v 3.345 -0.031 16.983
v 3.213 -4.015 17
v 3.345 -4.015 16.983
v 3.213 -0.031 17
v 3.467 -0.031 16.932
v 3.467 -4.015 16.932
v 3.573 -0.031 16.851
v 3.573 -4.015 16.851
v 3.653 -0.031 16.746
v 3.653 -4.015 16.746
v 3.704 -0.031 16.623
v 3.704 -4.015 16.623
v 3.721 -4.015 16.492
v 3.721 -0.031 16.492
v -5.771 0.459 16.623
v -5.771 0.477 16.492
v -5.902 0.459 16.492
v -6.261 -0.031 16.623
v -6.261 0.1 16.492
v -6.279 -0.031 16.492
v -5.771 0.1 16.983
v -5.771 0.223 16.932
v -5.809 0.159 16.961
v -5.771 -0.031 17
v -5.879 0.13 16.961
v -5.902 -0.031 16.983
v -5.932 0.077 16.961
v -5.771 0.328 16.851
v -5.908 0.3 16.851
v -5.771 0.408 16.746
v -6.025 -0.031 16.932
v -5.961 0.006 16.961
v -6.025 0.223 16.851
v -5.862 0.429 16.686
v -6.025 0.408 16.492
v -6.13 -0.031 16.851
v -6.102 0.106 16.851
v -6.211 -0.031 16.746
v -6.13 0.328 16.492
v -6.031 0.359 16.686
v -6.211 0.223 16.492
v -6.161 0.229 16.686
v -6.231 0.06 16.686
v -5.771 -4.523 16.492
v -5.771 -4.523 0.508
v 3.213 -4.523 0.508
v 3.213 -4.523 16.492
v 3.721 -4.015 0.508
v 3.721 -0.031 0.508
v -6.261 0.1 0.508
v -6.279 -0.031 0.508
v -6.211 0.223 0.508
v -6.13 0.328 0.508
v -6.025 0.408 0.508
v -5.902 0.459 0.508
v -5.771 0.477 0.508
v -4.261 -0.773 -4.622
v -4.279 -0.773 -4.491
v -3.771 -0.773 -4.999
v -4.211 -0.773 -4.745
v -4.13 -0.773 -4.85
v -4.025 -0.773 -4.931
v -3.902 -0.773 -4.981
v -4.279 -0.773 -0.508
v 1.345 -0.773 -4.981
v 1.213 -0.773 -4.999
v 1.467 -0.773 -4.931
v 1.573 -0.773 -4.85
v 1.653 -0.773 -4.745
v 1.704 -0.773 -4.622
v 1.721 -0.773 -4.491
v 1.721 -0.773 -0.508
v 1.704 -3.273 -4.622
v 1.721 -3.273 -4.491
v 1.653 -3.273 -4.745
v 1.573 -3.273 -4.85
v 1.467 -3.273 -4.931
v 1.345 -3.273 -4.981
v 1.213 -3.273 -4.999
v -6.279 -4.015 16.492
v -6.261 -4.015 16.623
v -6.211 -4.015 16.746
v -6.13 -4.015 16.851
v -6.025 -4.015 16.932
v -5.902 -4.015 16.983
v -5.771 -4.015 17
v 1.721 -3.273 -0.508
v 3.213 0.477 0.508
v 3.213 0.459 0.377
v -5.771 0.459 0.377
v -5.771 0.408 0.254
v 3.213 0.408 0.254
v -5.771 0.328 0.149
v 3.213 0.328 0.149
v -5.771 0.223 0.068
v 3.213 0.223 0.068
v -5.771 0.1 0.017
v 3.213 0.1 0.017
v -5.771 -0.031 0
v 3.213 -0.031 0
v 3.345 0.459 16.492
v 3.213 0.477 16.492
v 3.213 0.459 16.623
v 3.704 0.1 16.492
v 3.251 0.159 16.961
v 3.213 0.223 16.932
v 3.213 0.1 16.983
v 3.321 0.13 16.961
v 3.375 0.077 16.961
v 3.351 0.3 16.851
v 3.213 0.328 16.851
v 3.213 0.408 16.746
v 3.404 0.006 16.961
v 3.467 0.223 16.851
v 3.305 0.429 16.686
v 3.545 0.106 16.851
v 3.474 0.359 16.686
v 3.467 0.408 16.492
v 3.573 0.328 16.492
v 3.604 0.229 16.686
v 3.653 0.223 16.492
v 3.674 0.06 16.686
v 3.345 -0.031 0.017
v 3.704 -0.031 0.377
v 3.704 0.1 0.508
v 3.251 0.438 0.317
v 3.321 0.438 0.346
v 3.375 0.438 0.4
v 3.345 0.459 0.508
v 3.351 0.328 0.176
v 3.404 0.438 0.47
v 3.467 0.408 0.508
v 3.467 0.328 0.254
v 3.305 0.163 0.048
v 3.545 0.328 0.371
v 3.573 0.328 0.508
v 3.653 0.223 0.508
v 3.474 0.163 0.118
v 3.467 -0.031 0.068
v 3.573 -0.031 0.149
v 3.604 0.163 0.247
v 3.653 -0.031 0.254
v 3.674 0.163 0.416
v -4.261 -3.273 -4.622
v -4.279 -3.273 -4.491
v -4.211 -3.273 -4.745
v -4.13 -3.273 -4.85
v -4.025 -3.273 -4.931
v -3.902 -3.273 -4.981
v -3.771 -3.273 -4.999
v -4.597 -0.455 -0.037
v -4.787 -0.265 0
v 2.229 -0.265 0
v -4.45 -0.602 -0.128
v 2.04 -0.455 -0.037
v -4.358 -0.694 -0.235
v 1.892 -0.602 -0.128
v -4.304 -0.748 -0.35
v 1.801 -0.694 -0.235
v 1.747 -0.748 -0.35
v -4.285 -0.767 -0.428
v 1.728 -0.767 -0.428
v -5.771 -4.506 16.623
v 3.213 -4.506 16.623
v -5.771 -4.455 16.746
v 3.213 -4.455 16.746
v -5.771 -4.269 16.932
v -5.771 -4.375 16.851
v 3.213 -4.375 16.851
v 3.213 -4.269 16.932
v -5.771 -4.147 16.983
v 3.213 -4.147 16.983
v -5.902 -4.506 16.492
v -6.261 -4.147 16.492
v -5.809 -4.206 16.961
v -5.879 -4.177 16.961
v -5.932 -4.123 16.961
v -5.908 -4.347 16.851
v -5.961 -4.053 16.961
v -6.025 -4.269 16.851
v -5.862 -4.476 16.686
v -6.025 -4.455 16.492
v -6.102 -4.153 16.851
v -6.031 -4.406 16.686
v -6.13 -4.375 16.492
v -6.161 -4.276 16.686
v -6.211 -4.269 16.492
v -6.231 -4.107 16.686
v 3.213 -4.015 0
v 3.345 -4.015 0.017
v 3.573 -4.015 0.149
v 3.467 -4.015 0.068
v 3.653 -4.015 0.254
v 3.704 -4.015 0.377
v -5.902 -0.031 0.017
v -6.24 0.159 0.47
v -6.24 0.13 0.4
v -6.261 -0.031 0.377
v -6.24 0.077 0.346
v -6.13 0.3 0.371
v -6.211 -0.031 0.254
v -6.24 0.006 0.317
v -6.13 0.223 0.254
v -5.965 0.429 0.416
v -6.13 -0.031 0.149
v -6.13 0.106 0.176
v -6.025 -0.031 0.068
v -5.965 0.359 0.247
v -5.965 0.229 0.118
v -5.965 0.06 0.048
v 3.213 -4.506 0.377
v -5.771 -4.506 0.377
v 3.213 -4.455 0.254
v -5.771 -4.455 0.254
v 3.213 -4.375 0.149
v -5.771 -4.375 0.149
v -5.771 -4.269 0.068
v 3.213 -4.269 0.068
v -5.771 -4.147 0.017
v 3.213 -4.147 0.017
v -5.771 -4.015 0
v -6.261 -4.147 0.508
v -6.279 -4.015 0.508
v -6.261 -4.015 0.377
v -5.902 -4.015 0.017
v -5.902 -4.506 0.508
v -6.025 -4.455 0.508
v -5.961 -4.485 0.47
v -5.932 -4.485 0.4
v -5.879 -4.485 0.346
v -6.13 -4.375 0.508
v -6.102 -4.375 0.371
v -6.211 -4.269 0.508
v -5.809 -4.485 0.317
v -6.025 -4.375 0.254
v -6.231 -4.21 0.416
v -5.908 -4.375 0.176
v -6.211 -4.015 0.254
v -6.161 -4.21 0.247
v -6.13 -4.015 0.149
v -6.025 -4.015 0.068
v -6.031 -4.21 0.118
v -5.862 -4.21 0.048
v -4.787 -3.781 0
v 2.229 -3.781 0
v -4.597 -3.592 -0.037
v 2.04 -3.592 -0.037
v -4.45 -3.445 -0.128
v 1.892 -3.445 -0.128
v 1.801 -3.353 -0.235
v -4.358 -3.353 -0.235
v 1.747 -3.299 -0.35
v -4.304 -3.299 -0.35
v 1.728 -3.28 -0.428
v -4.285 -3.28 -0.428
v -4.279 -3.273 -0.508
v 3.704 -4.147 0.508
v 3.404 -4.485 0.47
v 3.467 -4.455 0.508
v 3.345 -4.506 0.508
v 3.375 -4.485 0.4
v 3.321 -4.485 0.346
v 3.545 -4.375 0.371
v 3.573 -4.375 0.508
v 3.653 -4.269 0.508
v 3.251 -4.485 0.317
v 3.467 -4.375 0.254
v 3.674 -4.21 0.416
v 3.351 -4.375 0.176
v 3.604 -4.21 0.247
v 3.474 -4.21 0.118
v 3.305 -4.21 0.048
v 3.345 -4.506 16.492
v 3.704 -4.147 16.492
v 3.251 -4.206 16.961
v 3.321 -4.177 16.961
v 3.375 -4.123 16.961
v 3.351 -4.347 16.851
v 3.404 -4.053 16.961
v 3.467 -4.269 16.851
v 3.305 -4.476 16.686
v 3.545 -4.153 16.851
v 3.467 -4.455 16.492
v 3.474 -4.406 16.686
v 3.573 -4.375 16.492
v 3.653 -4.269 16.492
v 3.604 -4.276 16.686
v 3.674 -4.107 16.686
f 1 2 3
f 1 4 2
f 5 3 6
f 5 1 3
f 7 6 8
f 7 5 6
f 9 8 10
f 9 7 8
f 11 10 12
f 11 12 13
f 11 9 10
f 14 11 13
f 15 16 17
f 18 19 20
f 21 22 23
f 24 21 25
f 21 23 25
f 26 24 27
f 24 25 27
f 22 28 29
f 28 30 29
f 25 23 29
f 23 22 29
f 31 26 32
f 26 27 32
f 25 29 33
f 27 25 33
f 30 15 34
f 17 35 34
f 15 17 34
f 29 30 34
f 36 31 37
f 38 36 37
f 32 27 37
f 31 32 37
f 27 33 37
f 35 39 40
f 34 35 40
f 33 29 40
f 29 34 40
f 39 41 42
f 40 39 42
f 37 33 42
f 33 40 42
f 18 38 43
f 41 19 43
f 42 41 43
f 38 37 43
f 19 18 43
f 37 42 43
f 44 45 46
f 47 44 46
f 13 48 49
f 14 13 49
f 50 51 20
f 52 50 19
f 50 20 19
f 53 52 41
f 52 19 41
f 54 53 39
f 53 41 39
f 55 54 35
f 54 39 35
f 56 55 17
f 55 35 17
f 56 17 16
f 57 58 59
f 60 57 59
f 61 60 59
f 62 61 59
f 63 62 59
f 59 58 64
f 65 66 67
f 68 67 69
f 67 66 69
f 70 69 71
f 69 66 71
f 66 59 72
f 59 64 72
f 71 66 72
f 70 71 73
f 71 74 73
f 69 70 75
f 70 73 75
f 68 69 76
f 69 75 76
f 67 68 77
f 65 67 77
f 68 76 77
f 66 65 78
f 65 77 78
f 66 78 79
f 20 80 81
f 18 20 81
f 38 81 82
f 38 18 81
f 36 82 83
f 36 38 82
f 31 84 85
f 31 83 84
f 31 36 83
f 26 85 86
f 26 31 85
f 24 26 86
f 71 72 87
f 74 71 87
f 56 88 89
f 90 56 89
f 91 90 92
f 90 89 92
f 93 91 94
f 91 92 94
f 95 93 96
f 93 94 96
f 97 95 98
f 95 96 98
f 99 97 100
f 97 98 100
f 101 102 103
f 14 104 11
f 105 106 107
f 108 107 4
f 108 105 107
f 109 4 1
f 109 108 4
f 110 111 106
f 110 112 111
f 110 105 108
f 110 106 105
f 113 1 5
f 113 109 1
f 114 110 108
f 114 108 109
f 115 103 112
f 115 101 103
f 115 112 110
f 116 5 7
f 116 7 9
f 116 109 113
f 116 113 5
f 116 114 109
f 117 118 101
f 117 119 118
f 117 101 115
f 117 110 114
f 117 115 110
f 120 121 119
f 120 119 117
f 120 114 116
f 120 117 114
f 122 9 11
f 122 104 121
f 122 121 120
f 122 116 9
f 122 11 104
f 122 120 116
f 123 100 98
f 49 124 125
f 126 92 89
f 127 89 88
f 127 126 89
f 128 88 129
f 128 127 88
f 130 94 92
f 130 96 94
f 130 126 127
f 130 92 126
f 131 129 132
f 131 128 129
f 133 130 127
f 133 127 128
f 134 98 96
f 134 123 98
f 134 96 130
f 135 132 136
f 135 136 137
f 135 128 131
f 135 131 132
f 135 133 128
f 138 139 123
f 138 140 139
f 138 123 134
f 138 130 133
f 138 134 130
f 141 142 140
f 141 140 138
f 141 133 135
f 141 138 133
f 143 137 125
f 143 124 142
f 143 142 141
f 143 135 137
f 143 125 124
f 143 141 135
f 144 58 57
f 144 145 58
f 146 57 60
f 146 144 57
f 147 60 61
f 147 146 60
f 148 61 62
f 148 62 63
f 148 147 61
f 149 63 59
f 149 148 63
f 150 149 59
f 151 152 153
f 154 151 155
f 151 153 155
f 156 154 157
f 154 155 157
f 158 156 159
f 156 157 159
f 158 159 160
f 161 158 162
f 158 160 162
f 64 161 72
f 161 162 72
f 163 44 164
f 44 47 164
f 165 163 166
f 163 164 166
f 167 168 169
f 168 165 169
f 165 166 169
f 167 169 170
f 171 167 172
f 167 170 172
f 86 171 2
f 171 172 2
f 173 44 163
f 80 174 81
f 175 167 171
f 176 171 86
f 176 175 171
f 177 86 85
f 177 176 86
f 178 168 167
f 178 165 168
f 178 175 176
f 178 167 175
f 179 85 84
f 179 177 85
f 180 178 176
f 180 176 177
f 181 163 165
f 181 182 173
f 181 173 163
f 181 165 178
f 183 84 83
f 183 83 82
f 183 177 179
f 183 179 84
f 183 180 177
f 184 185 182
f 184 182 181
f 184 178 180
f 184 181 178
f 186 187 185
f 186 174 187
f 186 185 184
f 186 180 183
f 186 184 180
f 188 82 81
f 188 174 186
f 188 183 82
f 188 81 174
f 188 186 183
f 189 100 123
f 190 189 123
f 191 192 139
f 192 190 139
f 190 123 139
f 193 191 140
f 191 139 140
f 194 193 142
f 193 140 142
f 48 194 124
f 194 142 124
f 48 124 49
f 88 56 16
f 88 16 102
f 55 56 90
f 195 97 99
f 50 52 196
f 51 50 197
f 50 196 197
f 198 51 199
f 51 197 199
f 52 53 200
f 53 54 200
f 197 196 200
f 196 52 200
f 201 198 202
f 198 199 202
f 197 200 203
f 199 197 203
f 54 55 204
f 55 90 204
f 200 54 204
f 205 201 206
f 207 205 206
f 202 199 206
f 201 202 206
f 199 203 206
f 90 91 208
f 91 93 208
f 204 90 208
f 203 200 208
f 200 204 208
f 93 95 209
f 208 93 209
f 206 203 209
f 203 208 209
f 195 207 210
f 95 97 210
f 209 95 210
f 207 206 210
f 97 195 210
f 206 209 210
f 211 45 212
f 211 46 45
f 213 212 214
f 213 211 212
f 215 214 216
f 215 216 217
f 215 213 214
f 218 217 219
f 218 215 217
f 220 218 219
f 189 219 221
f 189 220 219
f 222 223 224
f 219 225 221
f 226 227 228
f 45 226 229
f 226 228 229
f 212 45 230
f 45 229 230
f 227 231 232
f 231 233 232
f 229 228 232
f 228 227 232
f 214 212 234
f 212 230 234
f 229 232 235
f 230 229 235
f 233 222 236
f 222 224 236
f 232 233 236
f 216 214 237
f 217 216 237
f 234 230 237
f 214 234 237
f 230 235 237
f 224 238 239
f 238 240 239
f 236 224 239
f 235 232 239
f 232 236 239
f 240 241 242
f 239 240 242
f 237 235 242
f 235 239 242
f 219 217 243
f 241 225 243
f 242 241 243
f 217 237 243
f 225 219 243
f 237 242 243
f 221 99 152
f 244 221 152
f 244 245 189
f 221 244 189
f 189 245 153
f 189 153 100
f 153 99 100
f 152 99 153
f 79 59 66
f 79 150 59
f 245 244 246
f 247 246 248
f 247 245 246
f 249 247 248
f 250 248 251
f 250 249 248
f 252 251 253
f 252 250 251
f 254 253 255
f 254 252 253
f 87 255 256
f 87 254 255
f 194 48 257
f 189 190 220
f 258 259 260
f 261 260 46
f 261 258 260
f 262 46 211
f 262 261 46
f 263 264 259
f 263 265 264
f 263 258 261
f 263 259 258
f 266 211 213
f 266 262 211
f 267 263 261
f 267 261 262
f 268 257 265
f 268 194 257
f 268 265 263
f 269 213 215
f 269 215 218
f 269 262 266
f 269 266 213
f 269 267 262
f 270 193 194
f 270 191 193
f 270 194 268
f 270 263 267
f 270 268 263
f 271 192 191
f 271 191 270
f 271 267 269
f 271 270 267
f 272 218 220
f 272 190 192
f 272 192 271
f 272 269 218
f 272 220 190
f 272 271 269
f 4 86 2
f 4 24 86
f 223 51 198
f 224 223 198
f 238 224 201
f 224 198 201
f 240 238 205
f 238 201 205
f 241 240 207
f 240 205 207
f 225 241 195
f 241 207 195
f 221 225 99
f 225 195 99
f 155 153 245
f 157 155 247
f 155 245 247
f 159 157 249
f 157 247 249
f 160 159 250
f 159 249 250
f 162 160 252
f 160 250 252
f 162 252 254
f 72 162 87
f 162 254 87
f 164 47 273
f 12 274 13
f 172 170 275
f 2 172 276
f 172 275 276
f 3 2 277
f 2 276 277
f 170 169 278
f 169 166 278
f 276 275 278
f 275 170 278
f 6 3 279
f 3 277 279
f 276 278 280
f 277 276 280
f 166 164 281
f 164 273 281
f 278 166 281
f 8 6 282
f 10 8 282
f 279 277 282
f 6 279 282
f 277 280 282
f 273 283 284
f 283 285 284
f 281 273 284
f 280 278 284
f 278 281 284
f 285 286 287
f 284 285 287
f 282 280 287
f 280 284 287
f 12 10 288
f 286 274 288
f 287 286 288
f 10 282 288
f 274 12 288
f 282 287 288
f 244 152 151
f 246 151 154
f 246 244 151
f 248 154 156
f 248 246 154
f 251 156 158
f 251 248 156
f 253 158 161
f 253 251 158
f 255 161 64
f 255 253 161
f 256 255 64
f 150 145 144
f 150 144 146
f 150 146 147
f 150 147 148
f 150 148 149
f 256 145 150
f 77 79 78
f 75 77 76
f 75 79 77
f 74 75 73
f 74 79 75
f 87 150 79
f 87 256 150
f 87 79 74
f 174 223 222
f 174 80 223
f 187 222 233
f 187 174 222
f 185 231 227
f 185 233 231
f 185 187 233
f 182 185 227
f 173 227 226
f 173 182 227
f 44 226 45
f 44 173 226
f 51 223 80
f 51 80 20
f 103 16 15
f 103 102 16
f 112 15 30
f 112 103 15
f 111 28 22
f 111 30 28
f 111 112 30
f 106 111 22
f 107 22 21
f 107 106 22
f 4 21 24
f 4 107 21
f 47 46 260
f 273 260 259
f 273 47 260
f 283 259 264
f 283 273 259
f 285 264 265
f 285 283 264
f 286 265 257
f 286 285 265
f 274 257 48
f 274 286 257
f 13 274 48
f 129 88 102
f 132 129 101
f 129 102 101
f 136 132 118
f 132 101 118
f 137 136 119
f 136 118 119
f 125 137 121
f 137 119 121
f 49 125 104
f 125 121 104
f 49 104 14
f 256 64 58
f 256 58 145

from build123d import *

# Parameters (mm, degrees)
F0_W     = 10
F0_H     = 5
F1_DEPTH = 16.999991
F2_W     = 5.999998
F2_H     = 2.499995
F3_DEPTH = 4.99872
F4_R     = 0.508


with BuildPart() as f1:
    # F0 (on Top) → F1 (new body)
    with BuildSketch(Plane.XY):
        with Locations((-1.278629, -2.023488)):
            Rectangle(F0_W, F0_H)
    extrude(amount=F1_DEPTH)

    # F2 (on face) → F3 (join)
    with BuildSketch(Plane(origin=(0, 0, 0), x_dir=(1, 0, 0), z_dir=(0, 0, -1))):
        with Locations((-1.278629, 2.023489)):
            Rectangle(F2_W, F2_H)
    extrude(amount=F3_DEPTH)

    # F4
    f4_edges = [f1.edges().sort_by_distance(p)[0] for p in [
        (-1.278629, -0.773491, 0),
        (1.72137, -2.023488, 0),
        (-4.278628, -2.023488, 0),
        (-1.278629, -3.273486, 0),
        (-4.278628, -2.023488, -4.99872),
        (1.72137, -2.023488, -4.99872),
        (3.721371, -2.023488, 0),
        (-1.278629, 0.476512, 0),
        (3.721371, 0.476512, 8.499996),
        (-6.278629, 0.476512, 8.499996),
        (-6.278629, -2.023488, 0),
        (-6.278629, -4.523488, 8.499996),
        (3.721371, -4.523488, 8.499996),
        (-1.278629, -4.523488, 0),
        (-1.278629, -4.523488, 16.999991),
        (-1.278629, 0.476512, 16.999991),
        (-6.278629, -2.023488, 16.999991),
        (3.721371, -2.023488, 16.999991),
    ]]
    fillet(f4_edges, radius=F4_R)


solid = f1.part
